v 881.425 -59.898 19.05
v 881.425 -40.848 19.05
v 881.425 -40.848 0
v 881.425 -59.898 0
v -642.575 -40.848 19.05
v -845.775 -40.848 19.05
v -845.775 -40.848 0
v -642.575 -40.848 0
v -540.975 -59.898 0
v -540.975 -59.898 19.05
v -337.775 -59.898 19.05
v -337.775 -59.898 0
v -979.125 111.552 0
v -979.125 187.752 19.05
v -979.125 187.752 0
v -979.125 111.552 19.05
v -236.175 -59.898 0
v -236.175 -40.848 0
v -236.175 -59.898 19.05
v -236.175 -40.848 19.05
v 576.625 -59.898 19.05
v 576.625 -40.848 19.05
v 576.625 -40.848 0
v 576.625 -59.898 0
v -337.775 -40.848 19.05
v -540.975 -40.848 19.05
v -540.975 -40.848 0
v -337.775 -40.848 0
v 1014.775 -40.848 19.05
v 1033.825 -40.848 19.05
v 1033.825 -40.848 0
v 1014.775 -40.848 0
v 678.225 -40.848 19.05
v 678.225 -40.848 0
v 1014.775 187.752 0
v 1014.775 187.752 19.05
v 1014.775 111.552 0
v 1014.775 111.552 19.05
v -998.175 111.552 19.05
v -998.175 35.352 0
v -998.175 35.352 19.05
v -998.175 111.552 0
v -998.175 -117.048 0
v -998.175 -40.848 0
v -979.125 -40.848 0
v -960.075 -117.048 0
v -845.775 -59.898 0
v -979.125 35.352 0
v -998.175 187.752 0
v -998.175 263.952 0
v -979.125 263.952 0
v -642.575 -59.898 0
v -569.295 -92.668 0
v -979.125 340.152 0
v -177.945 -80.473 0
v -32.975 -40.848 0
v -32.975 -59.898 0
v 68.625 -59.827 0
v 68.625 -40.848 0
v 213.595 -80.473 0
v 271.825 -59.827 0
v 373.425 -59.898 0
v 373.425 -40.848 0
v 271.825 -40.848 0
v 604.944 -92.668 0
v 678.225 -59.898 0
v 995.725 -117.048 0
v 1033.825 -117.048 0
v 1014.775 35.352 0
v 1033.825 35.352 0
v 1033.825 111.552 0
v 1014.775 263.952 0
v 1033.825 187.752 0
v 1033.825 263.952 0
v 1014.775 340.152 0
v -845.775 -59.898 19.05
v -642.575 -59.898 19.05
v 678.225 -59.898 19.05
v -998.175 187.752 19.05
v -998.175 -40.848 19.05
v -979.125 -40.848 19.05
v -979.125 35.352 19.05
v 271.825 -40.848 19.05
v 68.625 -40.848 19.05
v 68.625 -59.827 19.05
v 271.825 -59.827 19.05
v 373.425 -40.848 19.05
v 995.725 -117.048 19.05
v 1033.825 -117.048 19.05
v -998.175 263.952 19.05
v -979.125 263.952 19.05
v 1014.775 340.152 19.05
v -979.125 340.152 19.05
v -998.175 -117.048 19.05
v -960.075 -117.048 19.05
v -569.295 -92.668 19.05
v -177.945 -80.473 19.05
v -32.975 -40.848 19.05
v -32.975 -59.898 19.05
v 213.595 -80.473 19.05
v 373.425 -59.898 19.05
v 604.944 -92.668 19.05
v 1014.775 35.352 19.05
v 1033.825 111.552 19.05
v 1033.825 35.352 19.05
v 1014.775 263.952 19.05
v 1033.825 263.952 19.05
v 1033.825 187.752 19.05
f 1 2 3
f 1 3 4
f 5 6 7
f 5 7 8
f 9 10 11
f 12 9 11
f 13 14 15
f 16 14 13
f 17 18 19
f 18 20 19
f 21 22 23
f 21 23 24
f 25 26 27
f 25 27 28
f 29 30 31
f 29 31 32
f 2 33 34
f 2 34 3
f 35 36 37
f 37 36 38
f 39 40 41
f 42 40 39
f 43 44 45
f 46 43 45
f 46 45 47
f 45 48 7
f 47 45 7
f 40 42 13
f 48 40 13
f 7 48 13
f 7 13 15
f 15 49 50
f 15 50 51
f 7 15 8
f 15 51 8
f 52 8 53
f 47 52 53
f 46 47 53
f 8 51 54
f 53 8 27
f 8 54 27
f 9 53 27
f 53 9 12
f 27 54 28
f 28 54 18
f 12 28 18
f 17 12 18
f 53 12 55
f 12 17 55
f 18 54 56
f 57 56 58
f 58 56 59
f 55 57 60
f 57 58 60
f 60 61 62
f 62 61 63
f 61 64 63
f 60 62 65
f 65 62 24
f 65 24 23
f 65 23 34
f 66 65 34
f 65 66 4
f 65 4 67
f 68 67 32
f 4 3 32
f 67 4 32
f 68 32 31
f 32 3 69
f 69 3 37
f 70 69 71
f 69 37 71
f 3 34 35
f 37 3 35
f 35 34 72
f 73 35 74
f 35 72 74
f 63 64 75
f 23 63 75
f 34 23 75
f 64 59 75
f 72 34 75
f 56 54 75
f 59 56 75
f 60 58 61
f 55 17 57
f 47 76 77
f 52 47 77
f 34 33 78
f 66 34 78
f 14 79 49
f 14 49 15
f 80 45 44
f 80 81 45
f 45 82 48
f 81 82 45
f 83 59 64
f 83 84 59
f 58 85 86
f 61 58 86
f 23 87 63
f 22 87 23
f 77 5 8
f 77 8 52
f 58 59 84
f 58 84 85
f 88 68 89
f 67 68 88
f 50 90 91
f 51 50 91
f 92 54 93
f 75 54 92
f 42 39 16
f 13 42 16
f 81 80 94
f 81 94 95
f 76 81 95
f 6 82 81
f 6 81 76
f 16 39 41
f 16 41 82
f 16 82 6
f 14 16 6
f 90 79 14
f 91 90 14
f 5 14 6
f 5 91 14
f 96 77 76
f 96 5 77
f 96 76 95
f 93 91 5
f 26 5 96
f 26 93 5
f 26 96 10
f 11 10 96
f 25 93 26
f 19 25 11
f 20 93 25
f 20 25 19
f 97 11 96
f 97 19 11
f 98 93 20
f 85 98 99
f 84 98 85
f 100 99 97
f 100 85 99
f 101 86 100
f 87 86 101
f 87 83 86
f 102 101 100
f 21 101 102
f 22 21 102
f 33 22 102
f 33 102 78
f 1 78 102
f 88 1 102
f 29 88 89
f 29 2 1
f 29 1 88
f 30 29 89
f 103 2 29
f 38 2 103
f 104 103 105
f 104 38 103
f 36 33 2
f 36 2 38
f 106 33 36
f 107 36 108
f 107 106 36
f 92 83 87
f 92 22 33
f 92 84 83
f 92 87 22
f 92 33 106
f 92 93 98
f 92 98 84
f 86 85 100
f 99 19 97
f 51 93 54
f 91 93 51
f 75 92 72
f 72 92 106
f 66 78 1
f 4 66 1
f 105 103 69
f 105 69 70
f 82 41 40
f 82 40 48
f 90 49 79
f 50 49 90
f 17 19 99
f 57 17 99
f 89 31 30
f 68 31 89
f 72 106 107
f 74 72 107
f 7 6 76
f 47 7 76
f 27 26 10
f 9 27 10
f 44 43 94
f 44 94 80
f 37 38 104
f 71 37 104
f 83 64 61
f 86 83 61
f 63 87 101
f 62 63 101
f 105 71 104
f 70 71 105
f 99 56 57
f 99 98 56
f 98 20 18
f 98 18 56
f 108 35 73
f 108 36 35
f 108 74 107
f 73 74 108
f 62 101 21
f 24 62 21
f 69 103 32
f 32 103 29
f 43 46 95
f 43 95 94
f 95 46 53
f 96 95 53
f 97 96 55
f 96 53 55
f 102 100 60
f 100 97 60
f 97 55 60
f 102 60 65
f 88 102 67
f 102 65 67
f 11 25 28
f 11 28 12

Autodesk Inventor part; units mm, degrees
ref_plane "YZ Plane" through (0, 0, 0) normal (1, 0, 0) x (0, 1, 0)
ref_plane "XZ Plane" through (0, 0, 0) normal (0, 1, 0) x (-1, 0, 0)
ref_plane "XY Plane" through (0, 0, 0) normal (0, 0, 1) x (1, 0, 0)
sketch "Sketch1" plane through (0, 0, 0) normal (0, 0, 1) x (1, 0, 0)
  line L0 (-998.1754, 340.1521) -> (1033.8246, 340.1521)
  line L1 (1033.8246, 340.1521) -> (1033.8246, -117.0479)
  line L2 (-998.1754, -117.0479) -> (-998.1754, 340.1521)
  arc A0 (995.7246, -117.0479) -> (-960.0754, -117.0479) centre (17.8246, -12647.7146) ccw
  line L3 (1033.8246, -117.0479) -> (995.7246, -117.0479)
  line L4 (-960.0754, -117.0479) -> (-998.1754, -117.0479)
  point P0 (0, 0)
  dimension "d0" = 2032
  dimension "d1" = 457.2
extrude "Extrusion1" add sketch "Sketch1" along normal blind 19.05
sketch "Sketch2" plane through (0, 0, 19.05) normal (0, 0, 1) x (1, 0, 0)
  line L0 (1033.8246, 340.1521) -> (-998.1754, 340.1521) projected
  line L1 (-998.1754, -117.0479) -> (-960.0754, -117.0479) projected
  line L2 (-998.1754, 340.1521) -> (-979.1254, 340.1521)
  line L3 (-979.1254, 340.1521) -> (-979.1254, -117.0479)
  line L4 (-979.1254, -117.0479) -> (-998.1754, -117.0479)
  line L5 (-998.1754, -117.0479) -> (-998.1754, 340.1521)
  line L6 (1033.8246, -117.0479) -> (1033.8246, 340.1521) projected
  line L7 (1033.8246, 340.1521) -> (1014.7746, 340.1521)
  line L8 (1014.7746, 340.1521) -> (1014.7746, -117.0479)
  line L9 (1014.7746, -117.0479) -> (1033.8246, -117.0479)
  line L10 (1033.8246, -117.0479) -> (1033.8246, 340.1521)
  line L11 (-998.1754, 340.1521) -> (-998.1754, -117.0479) projected
  line L12 (-998.1754, 263.9521) -> (-979.1254, 263.9521)
  line L13 (1014.7746, 263.9521) -> (1033.8246, 263.9521)
  line L14 (-998.1754, 187.7521) -> (-979.1254, 187.7521)
  line L15 (1014.7746, 187.7521) -> (1033.8246, 187.7521)
  line L16 (-998.1754, 111.5521) -> (-979.1254, 111.5521)
  line L17 (1014.7746, 111.5521) -> (1033.8246, 111.5521)
  line L18 (-998.1754, 35.3521) -> (-979.1254, 35.3521)
  line L19 (1014.7746, 35.3521) -> (1033.8246, 35.3521)
  line L20 (1033.8246, -40.8479) -> (1014.7746, -40.8479)
  line L21 (-979.1254, -40.8479) -> (-998.1754, -40.8479)
  point P0 (0, 0)
  dimension "d7" = 19.05
  dimension "d8" = 19.05
extrude "Extrusion2" cut sketch "Sketch2" against normal blind 19.05 contours L6 L13 L8 L0 | L3 L12 L5 L0 | L6 L17 L8 L15 | L3 L16 L5 L14 | L6 L20 L8 L19 | L3 L21 L5 L18
sketch "Sketch4" plane through (0, 0, 19.05) normal (0, 0, 1) x (1, 0, 0)
  line L0 (-845.7754, -40.8479) -> (-845.7754, -59.8979)
  line L1 (-998.1754, 111.5521) -> (-998.1754, 35.3521) projected
  line L2 (-642.5754, -40.8479) -> (-642.5754, -59.8979)
  line L3 (-540.9754, -40.8479) -> (-540.9754, -59.8979)
  line L4 (-337.7754, -40.8479) -> (-337.7754, -59.8979)
  line L5 (-236.1754, -40.8479) -> (-236.1754, -59.8979)
  line L6 (-32.9754, -40.8479) -> (-32.9754, -59.8979)
  line L7 (68.6246, -40.8479) -> (68.6246, -59.8267)
  line L8 (271.8246, -40.8479) -> (271.8246, -59.8267)
  line L9 (373.4246, -40.8479) -> (373.4246, -59.8979)
  line L10 (576.6246, -40.8479) -> (576.6246, -59.8979)
  line L11 (678.2246, -40.8479) -> (678.2246, -59.8979)
  line L12 (881.4246, -40.8479) -> (881.4246, -59.8979)
  arc A0 (995.7246, -117.0479) -> (-960.0754, -117.0479) centre (17.8246, -12647.7146) ccw projected
  line L13 (-998.1754, -40.8479) -> (-998.1754, -117.0479) projected
  line L14 (1014.7746, 340.1521) -> (-979.1254, 340.1521) projected
  line L15 (1014.7746, 340.1521) -> (1014.7746, 263.9521) projected
  line L16 (-979.1254, 340.1521) -> (1014.7746, 340.1521)
  line L17 (-845.7754, -40.8479) -> (-642.5754, -40.8479)
  line L18 (-845.7754, -59.8979) -> (-642.5754, -59.8979)
  line L19 (-540.9754, -59.8979) -> (-337.7754, -59.8979)
  line L20 (-540.9754, -40.8479) -> (-337.7754, -40.8479)
  line L21 (-236.1754, -40.8479) -> (-32.9754, -40.8479)
  line L22 (68.6246, -40.8479) -> (271.8246, -40.8479)
  line L23 (373.4246, -59.8979) -> (576.6246, -59.8979)
  line L24 (678.2246, -59.8979) -> (881.4246, -59.8979)
  line L25 (373.4246, -40.8479) -> (576.6246, -40.8479)
  line L26 (678.2246, -40.8479) -> (881.4246, -40.8479)
  line L27 (-236.1754, -59.8979) -> (-32.9754, -59.8979)
  line L28 (68.6246, -59.8267) -> (271.8246, -59.8267)
  point P0 (0, 0)
  dimension "d18" = 152.4
  dimension "d19" = 203.2
  dimension "d26" = 457.2
  dimension "d27" = 203.2
  dimension "d28" = 101.6
  dimension "d29" = 203.2
  dimension "d30" = 101.6
  dimension "d31" = 101.6
  dimension "d32" = 101.6
  dimension "d33" = 203.2
  dimension "d34" = 203.2
  dimension "d35" = 203.2
extrude "Extrusion4" cut sketch "Sketch4" against normal blind 25.4
properties part number "back" material "Wood (Birch)"
